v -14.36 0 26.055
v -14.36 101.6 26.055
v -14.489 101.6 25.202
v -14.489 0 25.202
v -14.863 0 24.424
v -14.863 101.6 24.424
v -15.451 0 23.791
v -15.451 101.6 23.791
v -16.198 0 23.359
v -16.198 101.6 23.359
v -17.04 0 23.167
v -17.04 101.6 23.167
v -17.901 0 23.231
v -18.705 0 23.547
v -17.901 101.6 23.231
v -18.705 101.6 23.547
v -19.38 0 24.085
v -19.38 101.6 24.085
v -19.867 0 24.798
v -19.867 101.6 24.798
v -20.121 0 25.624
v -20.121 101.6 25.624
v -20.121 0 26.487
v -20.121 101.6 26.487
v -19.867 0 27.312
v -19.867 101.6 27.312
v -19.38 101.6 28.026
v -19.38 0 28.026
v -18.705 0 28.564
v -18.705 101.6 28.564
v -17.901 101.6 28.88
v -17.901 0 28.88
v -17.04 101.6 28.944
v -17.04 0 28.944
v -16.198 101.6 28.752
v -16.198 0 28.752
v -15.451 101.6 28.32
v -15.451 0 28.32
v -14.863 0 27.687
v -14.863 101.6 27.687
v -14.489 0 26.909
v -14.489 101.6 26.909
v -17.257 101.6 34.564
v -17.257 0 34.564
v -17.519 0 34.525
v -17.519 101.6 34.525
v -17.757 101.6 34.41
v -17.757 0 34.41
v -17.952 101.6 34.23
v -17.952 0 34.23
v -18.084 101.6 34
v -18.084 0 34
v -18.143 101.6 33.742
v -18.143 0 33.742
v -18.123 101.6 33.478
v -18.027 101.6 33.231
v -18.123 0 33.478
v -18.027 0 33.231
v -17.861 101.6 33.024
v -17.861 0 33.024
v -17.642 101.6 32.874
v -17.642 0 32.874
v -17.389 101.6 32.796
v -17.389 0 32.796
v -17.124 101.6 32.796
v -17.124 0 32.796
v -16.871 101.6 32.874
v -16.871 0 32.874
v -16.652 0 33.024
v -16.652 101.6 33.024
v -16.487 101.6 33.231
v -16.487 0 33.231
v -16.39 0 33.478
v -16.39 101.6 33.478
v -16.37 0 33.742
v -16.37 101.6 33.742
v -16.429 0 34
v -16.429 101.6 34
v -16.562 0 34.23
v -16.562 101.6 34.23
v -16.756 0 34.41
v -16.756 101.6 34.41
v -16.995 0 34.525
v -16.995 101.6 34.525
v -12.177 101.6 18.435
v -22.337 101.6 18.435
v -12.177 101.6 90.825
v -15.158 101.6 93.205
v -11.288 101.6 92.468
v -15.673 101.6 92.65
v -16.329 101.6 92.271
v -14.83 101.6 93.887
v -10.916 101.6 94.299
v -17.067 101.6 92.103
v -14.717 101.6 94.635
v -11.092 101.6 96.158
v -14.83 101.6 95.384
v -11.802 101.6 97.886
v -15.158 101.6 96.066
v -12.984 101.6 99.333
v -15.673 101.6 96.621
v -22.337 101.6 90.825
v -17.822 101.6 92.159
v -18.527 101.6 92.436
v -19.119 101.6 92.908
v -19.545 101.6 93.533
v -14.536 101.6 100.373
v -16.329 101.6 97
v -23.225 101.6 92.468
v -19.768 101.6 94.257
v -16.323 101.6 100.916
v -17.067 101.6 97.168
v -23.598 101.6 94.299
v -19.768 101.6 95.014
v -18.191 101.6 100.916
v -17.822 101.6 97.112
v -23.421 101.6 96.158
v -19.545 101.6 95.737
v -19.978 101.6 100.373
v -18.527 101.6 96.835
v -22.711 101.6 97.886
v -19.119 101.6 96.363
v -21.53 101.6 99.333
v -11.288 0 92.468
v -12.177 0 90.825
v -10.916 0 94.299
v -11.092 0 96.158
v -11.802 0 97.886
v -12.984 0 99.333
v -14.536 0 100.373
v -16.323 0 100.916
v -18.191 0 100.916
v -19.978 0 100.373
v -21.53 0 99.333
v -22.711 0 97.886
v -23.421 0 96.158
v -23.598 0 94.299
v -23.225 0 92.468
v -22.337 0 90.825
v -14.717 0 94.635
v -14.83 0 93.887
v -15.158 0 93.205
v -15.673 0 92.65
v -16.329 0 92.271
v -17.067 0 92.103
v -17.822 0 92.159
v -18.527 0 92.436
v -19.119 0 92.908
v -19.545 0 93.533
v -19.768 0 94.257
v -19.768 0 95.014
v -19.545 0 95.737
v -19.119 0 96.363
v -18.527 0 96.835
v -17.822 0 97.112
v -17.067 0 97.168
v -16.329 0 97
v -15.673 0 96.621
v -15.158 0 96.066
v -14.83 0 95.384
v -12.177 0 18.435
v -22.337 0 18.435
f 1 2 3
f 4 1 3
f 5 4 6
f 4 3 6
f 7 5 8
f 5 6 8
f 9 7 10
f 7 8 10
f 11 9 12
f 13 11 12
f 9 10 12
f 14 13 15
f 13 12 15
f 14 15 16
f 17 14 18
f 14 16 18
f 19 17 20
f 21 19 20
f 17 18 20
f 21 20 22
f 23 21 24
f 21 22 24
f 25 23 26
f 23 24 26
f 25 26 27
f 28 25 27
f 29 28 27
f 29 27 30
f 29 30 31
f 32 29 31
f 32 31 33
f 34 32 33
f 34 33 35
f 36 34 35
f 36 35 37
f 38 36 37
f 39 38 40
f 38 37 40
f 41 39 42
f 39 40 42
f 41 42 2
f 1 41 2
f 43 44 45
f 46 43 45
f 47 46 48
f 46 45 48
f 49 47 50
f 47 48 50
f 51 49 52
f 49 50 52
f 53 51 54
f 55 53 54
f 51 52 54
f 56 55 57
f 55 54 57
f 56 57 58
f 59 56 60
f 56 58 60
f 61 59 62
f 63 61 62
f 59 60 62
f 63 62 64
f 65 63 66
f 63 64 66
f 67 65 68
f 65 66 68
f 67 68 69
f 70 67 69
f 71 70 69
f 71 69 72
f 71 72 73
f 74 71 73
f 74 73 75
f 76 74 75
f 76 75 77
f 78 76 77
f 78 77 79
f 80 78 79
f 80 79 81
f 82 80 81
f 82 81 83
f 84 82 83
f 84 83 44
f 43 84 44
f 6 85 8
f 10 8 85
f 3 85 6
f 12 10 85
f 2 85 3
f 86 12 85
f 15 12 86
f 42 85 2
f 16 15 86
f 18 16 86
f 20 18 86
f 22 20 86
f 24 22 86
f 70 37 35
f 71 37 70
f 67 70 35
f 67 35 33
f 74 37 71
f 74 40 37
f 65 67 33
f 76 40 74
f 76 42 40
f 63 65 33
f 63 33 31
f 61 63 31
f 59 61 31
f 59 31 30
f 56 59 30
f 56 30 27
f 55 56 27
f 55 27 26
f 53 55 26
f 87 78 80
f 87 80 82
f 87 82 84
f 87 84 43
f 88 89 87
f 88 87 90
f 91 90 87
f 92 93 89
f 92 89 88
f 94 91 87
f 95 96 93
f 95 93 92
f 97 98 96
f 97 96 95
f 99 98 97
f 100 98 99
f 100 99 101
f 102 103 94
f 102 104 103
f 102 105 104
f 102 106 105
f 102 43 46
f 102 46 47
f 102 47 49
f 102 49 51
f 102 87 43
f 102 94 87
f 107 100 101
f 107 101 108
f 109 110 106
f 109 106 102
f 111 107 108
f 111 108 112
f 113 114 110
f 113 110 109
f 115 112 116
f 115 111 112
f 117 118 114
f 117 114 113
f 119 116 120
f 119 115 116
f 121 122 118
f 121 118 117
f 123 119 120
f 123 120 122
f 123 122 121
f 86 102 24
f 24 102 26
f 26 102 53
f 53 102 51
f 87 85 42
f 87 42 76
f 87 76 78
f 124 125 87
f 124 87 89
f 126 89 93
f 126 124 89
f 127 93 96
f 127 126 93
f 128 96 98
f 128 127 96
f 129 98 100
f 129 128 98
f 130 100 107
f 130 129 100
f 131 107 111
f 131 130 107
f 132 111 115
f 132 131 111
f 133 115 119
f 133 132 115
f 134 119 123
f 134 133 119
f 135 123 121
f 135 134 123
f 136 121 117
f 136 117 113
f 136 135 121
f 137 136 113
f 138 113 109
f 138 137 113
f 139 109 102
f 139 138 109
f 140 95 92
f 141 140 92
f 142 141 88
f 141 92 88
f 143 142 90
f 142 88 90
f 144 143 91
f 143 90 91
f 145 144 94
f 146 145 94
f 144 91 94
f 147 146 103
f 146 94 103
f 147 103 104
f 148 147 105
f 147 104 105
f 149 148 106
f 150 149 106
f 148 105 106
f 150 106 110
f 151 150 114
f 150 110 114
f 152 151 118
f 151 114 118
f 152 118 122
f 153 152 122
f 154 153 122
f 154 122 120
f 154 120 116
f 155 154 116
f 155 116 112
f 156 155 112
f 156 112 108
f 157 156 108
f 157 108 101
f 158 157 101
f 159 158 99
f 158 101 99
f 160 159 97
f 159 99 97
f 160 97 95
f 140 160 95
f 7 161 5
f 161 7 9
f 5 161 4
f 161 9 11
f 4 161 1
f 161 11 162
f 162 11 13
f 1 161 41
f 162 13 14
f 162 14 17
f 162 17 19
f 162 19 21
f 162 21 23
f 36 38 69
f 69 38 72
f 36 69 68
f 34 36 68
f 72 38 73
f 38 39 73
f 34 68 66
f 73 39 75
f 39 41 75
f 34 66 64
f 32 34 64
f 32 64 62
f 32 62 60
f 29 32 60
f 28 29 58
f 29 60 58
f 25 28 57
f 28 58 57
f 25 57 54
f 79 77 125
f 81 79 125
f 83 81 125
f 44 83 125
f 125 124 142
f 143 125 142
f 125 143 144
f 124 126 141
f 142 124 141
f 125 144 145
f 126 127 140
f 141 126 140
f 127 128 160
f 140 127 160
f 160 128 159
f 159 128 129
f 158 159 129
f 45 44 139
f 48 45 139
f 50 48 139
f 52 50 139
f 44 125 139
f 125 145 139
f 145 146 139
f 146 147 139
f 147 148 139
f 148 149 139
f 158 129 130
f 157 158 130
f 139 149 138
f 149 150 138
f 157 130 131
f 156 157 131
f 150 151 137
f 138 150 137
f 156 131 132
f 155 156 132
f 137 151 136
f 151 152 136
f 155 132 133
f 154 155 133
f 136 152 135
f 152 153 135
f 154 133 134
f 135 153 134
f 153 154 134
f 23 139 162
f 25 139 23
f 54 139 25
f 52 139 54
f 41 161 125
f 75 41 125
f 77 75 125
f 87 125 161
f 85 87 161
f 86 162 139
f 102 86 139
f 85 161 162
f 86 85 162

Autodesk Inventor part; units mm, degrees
ref_plane "YZ Plane" through (0, 0, 0) normal (1, 0, 0) x (0, 1, 0)
ref_plane "XZ Plane" through (0, 0, 0) normal (0, 1, 0) x (-1, 0, 0)
ref_plane "XY Plane" through (0, 0, 0) normal (0, 0, 1) x (1, 0, 0)
sketch "Sketch1" plane through (0, 0, 0) normal (0, 1, 0) x (-1, 0, 0)
  circle A0 centre (17.2567, 94.6354) radius 6.35
  line L0 (22.3367, 94.6354) -> (12.1767, 94.6354)
  line L1 (12.1767, 94.6354) -> (12.1767, 18.4354)
  line L2 (12.1767, 18.4354) -> (22.3367, 18.4354)
  line L3 (22.3367, 18.4354) -> (22.3367, 94.6354)
  point P0 (0, 0)
  dimension "d0" = 12.7
  dimension "d1" = 76.2
  dimension "d2" = 0
  dimension "d3" = 10.16
  dimension "d4" = 5.08
extrude "Extrusion1" add sketch "Sketch1" along normal blind 101.6
sketch "Sketch2" plane through (0, 101.6, 0) normal (0, 1, 0) x (1, 0, 0)
  arc A0 (-22.3367, -90.8254) -> (-12.1767, -90.8254) centre (-17.2567, -94.6354) ccw projected
  circle A1 centre (-17.2567, -94.6354) radius 2.54
  point P0 (0, 0)
  dimension "d7" = 5.08
extrude "Extrusion2" cut sketch "Sketch2" against normal blind 482.6
sketch "Sketch3" plane through (0, 101.6, 0) normal (0, 1, 0) x (1, 0, 0)
  circle A0 centre (-17.2567, -26.0554) radius 2.8969
  line L0 (-12.1767, -18.4354) -> (-22.3367, -18.4354) projected
  line L1 (-22.3367, -18.4354) -> (-22.3367, -90.8254) projected
  point P0 (0, 0)
  dimension "d10" = 7.62
  dimension "d11" = 5.08
extrude "Extrusion3" cut sketch "Sketch3" against normal blind 482.6
sketch "Sketch4" plane through (0, 101.6, 0) normal (0, 1, 0) x (1, 0, 0)
  circle A0 centre (-17.2567, -33.6754) radius 2.6633
  line L0 (-12.1767, -90.8254) -> (-12.1767, -18.4354) projected
  line L1 (-12.1767, -18.4354) -> (-22.3367, -18.4354) projected
  point P0 (0, 0)
  dimension "d14" = 5.08
  dimension "d15" = 15.24
hole "Hole1" at (-17.2567, 101.6, 33.6754) direction (0, -1, 0) diameter 1.778 end through all
properties part number "Gripper"
